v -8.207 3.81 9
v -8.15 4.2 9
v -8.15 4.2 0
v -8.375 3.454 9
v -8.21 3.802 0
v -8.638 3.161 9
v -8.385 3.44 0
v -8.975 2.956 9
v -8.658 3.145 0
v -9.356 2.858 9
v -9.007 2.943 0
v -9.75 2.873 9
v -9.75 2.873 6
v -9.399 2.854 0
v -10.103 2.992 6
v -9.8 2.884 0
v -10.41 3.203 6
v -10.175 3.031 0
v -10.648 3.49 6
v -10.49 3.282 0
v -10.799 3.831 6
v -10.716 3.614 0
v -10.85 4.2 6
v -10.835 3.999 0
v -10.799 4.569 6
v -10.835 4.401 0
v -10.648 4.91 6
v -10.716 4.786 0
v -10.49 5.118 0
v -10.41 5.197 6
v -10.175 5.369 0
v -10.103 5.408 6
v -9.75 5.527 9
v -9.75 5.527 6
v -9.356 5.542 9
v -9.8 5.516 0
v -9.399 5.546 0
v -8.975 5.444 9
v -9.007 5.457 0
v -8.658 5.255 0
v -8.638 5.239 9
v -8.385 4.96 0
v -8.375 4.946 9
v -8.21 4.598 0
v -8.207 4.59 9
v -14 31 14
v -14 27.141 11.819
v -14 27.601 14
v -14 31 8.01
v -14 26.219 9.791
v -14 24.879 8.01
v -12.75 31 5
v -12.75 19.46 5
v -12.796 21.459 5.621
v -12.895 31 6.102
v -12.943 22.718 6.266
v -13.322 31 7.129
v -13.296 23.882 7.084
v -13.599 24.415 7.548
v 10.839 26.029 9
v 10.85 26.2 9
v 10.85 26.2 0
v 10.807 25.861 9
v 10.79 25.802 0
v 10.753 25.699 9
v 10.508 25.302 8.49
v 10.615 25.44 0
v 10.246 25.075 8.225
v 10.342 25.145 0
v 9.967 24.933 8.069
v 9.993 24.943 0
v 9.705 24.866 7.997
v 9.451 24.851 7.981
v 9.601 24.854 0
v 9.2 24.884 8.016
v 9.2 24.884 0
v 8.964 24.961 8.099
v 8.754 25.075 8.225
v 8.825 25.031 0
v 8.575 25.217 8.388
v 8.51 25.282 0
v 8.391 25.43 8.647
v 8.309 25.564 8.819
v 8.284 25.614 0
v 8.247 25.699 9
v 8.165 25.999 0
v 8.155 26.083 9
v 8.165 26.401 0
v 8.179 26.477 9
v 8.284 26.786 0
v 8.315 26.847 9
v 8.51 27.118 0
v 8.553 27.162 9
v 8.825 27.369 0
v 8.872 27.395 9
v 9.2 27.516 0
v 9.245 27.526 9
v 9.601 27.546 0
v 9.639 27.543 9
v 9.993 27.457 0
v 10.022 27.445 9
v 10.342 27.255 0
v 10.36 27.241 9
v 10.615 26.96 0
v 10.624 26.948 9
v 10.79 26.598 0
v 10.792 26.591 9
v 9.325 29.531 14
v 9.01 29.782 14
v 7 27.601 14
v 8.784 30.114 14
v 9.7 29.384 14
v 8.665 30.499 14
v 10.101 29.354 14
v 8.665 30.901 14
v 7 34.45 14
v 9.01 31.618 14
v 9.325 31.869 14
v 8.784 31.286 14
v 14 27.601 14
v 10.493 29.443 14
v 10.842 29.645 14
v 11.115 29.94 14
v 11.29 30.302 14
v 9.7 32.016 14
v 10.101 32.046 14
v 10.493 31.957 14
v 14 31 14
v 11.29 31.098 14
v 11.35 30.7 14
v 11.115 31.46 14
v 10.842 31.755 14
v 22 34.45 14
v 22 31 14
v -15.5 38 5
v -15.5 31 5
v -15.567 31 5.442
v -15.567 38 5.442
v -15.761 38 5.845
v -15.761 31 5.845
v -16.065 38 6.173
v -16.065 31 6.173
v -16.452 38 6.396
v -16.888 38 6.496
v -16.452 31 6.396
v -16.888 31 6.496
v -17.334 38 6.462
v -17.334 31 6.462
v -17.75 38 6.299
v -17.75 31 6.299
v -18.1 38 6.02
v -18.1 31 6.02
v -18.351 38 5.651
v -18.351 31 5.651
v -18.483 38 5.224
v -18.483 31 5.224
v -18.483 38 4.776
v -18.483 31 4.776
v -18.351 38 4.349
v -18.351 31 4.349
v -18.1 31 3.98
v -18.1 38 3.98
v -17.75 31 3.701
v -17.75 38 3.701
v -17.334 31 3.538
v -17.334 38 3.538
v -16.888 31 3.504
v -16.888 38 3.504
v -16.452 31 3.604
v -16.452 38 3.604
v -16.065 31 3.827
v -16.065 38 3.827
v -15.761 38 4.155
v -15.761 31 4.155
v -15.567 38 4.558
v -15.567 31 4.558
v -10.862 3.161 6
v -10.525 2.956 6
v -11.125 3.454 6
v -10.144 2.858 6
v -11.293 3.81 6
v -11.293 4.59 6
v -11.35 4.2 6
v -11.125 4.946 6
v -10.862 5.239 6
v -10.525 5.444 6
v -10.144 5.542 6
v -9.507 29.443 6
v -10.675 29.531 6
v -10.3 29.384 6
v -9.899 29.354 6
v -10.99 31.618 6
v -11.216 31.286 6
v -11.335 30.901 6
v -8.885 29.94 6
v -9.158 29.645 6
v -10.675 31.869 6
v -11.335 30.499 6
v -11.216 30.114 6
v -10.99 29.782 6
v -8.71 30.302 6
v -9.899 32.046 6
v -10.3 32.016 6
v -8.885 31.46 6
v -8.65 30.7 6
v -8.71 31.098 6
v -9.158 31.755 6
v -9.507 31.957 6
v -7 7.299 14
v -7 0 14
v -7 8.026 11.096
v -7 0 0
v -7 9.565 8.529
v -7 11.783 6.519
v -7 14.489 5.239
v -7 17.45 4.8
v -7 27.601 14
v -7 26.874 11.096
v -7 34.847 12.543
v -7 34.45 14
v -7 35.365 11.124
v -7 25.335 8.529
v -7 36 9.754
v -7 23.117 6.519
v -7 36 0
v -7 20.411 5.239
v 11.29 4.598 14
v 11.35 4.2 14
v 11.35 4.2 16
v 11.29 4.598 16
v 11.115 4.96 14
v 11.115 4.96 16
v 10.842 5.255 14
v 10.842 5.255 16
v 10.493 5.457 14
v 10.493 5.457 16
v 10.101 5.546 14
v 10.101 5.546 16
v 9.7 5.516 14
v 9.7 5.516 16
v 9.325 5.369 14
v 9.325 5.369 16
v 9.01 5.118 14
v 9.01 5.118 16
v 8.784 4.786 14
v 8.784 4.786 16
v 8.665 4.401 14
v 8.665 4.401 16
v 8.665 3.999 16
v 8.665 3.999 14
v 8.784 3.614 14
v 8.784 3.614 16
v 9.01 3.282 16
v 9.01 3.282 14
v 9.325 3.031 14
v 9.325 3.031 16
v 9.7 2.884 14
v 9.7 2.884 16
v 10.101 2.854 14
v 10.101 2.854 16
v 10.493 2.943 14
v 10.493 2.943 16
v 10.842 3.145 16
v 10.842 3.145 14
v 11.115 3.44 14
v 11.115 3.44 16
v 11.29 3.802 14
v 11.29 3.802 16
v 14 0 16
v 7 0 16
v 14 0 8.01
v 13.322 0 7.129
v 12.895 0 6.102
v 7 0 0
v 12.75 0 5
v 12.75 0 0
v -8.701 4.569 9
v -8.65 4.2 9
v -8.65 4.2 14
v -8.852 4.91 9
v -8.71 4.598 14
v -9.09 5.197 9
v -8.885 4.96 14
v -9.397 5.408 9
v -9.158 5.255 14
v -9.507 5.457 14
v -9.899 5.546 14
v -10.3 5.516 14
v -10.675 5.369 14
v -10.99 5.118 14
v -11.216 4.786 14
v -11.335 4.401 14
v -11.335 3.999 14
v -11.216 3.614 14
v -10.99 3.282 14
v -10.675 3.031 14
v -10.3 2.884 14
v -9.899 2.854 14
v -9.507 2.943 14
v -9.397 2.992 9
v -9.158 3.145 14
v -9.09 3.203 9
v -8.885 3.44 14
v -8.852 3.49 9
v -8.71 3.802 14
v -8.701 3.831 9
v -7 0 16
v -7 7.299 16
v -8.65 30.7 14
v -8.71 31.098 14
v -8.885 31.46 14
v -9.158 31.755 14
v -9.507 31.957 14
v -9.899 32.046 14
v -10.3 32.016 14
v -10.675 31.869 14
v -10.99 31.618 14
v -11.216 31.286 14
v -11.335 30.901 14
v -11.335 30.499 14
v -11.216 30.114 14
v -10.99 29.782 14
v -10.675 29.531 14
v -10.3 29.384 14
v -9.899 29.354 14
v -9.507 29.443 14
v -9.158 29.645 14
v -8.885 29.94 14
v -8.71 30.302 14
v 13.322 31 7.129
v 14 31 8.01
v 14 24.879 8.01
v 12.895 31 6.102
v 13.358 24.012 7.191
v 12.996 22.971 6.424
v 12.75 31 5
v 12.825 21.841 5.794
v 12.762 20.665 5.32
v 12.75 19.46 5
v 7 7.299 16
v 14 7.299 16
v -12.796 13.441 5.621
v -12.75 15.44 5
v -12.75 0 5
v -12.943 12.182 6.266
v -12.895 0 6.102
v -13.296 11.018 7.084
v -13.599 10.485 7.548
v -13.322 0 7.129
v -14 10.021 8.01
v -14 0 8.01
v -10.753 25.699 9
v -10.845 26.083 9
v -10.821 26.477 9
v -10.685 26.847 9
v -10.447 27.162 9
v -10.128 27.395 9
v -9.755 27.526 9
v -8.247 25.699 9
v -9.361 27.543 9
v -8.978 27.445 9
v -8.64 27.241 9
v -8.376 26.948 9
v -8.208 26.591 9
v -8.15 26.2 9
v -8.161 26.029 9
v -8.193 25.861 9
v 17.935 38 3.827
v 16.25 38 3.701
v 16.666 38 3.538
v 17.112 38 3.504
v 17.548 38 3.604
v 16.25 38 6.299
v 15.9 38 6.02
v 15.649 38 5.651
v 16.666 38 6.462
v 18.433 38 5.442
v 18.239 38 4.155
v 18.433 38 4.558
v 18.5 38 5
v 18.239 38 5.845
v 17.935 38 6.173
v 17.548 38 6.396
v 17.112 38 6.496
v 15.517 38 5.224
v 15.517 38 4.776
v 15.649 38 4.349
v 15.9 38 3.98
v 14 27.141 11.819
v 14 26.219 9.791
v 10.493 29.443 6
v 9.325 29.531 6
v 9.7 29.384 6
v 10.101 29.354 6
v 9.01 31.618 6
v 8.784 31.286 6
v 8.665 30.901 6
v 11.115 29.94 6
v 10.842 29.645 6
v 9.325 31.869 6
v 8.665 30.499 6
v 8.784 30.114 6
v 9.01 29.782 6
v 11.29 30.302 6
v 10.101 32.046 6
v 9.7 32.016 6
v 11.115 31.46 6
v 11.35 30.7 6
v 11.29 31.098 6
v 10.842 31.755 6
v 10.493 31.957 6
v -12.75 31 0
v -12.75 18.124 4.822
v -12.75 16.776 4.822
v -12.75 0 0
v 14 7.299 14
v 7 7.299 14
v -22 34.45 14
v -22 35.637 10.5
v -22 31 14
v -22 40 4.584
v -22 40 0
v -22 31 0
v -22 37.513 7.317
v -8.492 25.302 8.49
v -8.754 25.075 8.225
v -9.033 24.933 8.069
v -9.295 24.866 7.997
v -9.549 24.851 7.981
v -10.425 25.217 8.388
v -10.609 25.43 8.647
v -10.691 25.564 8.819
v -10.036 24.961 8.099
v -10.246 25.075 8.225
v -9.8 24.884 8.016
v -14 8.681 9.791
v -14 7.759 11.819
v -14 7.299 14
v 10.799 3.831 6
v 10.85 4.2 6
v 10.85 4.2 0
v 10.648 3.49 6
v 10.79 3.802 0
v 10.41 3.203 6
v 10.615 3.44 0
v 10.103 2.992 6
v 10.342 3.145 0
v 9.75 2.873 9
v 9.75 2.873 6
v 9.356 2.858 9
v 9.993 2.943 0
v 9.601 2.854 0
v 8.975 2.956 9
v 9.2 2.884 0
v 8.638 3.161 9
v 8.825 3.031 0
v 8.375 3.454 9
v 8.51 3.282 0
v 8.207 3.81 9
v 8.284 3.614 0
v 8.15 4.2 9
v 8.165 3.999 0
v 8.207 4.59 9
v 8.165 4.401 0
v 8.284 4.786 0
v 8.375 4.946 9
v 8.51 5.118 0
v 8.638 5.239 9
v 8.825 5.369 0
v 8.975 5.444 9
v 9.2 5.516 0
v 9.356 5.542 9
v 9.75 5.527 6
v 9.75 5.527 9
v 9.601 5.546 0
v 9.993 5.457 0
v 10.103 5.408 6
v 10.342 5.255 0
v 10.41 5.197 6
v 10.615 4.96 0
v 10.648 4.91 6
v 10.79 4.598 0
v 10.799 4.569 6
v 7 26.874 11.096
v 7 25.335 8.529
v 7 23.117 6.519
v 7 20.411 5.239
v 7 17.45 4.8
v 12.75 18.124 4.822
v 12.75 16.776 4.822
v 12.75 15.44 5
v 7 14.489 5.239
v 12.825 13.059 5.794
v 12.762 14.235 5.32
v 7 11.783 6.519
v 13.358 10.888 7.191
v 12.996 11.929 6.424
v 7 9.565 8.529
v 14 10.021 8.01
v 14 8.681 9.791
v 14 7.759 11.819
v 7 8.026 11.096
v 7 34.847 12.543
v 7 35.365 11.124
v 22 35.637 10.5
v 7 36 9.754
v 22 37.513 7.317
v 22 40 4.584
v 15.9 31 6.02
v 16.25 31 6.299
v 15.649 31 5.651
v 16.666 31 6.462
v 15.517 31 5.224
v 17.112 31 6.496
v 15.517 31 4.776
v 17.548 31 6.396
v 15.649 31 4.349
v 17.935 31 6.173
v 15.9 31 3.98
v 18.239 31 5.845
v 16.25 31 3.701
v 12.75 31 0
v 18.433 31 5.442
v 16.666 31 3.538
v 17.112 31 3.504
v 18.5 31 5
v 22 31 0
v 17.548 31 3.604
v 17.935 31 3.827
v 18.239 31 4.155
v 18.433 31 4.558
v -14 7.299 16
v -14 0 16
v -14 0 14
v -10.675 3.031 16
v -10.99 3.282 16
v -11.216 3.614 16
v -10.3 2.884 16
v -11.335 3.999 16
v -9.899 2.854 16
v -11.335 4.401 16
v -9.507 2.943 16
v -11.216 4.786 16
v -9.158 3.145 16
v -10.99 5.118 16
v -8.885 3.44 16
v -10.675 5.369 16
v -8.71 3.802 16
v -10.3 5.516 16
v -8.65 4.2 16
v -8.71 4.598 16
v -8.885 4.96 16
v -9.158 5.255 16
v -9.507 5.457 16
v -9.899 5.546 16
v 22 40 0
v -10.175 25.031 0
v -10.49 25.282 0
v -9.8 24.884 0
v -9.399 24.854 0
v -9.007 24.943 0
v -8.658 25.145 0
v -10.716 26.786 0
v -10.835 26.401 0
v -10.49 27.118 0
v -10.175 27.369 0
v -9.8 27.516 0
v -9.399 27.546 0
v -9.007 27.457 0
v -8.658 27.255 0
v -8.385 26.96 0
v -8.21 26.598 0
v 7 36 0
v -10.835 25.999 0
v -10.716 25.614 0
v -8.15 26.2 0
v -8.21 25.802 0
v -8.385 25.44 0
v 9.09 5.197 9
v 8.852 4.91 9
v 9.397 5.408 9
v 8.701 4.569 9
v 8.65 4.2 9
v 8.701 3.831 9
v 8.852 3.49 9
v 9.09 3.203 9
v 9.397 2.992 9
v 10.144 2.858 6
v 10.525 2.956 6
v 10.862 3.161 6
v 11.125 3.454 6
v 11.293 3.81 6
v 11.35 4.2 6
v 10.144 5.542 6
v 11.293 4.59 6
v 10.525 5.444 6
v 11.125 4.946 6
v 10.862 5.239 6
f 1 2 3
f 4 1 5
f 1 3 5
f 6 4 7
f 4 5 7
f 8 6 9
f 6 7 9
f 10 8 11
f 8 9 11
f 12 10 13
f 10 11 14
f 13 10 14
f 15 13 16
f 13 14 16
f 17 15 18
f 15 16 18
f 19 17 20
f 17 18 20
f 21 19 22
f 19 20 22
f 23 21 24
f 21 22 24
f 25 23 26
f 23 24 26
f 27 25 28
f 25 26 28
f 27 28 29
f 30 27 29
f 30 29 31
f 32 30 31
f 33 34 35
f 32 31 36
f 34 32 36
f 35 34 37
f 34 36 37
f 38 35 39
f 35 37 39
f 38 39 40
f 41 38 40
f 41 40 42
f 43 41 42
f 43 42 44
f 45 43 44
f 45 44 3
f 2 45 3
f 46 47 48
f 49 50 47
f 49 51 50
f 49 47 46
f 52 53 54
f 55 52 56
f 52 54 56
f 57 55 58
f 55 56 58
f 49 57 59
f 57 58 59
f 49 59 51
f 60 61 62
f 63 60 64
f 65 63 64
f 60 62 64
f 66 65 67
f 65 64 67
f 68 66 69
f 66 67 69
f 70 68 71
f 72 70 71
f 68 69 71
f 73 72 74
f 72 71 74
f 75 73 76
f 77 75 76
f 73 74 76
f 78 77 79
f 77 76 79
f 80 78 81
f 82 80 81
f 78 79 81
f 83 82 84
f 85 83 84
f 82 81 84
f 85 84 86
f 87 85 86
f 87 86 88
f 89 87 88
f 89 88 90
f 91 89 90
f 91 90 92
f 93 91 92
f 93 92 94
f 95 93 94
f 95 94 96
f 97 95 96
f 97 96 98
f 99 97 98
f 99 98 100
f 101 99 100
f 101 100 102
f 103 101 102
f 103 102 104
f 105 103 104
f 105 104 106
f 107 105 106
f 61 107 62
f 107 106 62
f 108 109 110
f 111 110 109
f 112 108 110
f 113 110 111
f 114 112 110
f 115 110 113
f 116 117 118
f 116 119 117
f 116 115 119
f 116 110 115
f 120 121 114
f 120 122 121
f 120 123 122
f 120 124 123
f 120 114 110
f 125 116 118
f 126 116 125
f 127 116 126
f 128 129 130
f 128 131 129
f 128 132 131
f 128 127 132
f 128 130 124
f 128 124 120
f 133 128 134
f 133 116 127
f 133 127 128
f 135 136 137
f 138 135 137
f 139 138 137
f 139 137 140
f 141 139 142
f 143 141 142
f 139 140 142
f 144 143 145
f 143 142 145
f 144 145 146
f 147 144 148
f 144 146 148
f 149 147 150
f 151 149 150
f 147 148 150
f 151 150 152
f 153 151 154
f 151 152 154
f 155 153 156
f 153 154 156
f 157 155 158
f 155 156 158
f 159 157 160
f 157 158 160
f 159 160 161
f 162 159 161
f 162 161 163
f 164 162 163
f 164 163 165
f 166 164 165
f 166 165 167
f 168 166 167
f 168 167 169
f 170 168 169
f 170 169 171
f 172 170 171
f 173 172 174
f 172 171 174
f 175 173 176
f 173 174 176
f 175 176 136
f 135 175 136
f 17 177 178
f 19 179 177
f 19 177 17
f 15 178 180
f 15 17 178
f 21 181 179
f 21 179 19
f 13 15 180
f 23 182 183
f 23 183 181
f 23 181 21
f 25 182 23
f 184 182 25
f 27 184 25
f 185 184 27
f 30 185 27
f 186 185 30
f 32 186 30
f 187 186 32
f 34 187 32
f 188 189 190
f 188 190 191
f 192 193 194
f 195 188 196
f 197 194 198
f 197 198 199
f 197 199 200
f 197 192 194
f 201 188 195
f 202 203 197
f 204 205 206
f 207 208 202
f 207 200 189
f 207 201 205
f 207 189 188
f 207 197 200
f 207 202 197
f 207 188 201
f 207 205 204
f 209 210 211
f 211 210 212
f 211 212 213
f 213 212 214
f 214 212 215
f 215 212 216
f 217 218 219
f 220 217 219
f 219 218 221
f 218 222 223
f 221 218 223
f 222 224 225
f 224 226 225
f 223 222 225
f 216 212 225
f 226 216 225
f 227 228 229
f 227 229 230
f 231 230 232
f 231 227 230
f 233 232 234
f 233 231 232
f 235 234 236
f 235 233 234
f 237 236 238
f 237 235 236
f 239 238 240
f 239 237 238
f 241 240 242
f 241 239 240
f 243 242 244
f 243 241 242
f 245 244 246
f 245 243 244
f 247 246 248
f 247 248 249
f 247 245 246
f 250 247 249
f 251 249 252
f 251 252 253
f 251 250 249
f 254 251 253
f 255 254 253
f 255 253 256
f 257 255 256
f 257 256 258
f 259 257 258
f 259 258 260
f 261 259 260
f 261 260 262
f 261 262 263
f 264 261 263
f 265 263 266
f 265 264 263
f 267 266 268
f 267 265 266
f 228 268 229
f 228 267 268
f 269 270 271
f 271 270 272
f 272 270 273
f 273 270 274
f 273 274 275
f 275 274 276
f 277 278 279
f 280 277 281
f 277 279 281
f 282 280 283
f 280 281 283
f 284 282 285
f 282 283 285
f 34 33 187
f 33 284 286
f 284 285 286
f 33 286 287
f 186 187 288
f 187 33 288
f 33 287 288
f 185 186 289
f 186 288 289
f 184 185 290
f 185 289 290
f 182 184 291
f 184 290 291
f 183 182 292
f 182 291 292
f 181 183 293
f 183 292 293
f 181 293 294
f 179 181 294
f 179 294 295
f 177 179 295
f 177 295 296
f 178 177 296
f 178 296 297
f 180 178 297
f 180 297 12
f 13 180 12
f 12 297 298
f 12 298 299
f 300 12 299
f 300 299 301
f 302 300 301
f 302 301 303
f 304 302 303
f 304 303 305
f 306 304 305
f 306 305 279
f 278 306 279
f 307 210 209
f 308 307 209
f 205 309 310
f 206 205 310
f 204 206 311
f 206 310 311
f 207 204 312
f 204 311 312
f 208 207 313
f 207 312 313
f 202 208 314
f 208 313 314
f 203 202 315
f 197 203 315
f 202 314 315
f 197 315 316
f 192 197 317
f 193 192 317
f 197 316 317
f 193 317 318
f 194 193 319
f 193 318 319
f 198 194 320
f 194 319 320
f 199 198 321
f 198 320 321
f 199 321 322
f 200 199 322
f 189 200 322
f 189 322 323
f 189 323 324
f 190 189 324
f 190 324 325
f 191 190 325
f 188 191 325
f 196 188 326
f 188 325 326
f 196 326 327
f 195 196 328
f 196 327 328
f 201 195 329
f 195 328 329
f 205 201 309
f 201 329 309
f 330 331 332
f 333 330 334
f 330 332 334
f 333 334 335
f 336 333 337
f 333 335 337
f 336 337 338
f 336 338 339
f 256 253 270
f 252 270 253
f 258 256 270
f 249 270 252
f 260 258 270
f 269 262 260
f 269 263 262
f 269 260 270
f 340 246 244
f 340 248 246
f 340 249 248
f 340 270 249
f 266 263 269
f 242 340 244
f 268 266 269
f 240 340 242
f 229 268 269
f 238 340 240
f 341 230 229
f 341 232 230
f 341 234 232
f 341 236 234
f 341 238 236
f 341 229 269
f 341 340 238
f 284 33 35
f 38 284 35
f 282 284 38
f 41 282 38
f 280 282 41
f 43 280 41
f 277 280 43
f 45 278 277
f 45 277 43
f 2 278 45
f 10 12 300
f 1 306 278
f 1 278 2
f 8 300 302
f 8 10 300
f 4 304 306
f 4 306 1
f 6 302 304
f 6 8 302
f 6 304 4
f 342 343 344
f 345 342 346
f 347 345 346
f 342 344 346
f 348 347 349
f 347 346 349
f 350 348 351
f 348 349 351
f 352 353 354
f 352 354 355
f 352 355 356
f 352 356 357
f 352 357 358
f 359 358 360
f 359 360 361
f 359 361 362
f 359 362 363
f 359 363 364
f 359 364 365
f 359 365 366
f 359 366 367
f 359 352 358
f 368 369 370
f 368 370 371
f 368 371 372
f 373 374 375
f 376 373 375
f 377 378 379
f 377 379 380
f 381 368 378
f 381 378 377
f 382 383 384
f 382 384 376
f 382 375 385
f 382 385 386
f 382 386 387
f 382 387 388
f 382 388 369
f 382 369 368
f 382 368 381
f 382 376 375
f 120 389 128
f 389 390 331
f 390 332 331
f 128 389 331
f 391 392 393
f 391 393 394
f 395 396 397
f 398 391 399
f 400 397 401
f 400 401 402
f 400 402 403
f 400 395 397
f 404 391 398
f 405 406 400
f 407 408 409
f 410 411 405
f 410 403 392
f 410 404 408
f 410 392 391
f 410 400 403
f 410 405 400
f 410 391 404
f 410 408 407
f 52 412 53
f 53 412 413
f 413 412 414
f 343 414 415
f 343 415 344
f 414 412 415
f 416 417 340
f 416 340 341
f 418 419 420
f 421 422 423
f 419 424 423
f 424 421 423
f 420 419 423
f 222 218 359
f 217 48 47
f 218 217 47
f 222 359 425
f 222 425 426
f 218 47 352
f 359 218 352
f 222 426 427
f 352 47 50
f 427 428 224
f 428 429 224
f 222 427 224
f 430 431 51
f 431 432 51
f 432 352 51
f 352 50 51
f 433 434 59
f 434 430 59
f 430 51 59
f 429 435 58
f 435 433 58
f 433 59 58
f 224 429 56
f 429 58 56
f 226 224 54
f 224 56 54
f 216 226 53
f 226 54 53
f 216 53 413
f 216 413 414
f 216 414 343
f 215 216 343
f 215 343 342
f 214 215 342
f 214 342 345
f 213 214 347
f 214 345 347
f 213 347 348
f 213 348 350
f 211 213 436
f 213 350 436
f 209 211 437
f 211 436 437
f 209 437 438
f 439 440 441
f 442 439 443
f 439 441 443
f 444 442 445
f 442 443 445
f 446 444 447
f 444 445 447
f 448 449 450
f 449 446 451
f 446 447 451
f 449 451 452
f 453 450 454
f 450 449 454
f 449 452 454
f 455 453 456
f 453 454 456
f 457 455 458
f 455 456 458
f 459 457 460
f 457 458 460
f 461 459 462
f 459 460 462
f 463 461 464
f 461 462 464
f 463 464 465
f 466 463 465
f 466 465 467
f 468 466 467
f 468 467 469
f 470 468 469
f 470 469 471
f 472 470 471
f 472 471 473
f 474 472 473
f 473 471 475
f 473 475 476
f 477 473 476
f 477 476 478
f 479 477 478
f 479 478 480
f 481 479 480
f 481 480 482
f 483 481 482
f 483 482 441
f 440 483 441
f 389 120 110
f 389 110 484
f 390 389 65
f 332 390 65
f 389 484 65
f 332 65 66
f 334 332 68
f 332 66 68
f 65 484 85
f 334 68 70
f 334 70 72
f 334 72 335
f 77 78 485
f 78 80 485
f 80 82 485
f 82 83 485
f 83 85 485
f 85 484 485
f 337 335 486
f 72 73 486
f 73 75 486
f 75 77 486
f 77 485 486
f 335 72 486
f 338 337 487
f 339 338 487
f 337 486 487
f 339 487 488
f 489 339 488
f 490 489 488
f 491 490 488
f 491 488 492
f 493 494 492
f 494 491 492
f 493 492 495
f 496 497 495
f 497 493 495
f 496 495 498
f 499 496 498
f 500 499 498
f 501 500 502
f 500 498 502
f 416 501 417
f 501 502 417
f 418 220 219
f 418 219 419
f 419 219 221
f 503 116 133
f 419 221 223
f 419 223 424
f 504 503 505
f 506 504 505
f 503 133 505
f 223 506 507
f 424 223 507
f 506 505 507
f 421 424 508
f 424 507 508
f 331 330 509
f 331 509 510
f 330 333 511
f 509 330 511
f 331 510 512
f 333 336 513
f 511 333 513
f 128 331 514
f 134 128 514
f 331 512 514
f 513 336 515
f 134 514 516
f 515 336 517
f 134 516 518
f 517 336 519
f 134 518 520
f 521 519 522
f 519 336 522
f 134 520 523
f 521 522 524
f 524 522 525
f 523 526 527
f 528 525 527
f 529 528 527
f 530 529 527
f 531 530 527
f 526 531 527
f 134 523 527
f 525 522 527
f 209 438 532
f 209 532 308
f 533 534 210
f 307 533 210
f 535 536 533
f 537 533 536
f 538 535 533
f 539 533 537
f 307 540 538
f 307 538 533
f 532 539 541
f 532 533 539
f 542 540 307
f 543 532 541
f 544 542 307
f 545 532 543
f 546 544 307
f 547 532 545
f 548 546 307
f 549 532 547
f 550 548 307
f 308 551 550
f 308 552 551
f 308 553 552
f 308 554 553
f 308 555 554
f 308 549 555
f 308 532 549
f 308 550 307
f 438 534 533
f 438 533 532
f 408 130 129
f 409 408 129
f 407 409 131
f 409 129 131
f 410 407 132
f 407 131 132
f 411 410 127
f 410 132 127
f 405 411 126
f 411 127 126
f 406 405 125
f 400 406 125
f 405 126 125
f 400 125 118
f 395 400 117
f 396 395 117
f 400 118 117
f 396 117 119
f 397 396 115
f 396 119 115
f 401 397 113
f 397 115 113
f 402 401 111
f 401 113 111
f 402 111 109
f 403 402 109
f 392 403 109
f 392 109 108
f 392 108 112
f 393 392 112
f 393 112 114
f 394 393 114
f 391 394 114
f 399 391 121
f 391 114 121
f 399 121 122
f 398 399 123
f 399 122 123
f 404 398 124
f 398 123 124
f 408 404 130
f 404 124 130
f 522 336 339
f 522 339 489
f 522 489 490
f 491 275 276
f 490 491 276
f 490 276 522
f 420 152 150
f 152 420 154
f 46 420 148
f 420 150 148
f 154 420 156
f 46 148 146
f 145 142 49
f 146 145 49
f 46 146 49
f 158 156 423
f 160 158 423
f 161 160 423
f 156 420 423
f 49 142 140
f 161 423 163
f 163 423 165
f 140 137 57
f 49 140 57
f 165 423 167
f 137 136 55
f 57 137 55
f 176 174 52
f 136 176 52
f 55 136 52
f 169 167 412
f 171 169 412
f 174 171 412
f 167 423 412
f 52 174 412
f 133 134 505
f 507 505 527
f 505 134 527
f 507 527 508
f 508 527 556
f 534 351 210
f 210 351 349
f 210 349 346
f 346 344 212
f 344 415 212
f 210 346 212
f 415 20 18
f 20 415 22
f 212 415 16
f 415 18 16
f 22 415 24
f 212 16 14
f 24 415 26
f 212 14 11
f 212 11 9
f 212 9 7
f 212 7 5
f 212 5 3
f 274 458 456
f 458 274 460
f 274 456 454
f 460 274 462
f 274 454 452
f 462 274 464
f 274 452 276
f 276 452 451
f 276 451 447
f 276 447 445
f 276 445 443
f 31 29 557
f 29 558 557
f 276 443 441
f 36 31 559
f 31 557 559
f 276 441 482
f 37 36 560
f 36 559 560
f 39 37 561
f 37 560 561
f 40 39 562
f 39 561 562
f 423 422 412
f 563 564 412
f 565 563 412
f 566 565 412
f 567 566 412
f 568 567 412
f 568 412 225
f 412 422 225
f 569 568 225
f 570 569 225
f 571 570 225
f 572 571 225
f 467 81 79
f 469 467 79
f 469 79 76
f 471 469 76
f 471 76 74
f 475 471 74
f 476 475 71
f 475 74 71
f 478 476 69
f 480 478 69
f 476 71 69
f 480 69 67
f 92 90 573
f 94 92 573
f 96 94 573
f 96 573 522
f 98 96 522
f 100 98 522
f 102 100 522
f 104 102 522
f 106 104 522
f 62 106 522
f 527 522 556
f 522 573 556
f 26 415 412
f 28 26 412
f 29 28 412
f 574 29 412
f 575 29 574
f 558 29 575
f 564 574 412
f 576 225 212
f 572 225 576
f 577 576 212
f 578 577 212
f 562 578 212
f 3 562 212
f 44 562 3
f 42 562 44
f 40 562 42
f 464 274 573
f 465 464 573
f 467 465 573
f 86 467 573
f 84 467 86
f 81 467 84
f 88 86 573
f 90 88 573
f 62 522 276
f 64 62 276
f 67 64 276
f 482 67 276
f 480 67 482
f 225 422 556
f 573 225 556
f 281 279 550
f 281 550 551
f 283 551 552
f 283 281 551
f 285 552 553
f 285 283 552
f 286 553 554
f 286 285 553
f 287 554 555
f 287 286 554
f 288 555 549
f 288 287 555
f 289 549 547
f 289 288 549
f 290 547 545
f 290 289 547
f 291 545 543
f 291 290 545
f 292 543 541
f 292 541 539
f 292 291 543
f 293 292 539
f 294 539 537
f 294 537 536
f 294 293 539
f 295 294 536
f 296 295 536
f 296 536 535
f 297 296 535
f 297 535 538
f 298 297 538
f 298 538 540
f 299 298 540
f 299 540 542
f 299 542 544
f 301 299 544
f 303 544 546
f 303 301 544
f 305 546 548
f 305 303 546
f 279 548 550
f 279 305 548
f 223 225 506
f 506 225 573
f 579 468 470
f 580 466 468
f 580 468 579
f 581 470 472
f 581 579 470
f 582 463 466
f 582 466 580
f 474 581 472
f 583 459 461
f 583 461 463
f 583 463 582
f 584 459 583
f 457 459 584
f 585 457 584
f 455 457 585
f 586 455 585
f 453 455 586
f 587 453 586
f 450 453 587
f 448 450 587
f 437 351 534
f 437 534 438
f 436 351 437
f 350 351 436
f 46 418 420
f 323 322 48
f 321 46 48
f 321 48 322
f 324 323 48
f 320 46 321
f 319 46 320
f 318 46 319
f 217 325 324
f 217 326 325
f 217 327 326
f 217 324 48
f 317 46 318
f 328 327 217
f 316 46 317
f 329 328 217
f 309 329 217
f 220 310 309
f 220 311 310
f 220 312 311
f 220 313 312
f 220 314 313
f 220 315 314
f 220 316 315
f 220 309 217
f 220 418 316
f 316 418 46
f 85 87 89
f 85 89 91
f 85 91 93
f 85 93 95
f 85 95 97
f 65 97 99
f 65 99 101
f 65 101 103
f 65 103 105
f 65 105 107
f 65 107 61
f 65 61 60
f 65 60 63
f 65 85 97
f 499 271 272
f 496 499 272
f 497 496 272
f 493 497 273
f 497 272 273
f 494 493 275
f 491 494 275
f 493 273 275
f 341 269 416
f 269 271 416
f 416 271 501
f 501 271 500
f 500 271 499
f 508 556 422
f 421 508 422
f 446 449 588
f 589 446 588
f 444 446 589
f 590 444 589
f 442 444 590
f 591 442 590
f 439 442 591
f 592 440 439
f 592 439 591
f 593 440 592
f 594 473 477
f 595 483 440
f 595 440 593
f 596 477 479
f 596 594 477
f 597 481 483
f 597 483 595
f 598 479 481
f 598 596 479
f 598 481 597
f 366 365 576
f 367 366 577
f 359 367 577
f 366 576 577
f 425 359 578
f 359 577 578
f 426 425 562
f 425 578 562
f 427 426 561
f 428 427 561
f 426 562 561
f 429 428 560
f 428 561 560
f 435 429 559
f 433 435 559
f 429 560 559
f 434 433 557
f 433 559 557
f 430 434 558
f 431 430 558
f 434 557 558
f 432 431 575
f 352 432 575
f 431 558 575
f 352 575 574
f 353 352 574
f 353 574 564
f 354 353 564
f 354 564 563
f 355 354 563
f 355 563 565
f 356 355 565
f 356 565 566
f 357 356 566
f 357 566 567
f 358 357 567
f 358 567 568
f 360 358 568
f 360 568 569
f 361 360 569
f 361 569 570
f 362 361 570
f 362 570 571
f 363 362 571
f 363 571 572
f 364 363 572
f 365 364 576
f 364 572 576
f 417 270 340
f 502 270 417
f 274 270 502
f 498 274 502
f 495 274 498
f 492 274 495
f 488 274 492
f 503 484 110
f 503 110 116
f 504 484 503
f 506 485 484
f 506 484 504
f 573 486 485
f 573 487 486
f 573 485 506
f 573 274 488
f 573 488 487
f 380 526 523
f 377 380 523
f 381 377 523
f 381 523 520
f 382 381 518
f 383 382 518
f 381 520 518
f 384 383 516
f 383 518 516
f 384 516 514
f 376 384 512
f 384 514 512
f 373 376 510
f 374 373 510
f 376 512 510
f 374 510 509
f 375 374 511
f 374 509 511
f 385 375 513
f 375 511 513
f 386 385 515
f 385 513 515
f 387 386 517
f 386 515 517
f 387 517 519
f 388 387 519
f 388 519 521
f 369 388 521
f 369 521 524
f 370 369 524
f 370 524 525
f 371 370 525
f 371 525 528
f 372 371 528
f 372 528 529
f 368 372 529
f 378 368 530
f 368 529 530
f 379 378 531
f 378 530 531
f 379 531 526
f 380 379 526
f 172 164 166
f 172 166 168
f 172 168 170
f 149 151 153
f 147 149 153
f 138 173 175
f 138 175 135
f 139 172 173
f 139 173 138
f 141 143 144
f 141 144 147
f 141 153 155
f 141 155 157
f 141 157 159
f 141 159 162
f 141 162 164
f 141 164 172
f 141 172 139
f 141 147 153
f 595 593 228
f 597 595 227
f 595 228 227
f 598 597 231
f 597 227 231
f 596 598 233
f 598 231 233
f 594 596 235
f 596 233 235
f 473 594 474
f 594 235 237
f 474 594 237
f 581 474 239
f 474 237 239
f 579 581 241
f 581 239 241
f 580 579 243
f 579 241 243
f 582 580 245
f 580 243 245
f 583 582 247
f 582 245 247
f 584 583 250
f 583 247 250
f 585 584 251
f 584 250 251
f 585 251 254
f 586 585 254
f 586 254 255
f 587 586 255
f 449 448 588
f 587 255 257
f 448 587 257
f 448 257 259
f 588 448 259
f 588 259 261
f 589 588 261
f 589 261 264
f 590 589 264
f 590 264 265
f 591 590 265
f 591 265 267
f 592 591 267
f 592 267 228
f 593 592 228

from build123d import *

# Parameters (mm, degrees)
F0_W      = 7
F0_H      = 31
F1_DEPTH  = 14
F2_R      = 1.35
F3_DEPTH  = 8
F4_R      = 10.2
F5_DEPTH  = 30
F6_R      = 1.35
F7_DEPTH  = 9
F8_R      = 1.5
F9_DEPTH  = 7
F10_R     = 18
F11_DEPTH = 44.001
F13_DEPTH = 31
F14_W     = 7
F14_H     = 7.299138
F14_R     = 1.35
F15_DEPTH = 2


with BuildPart() as f1:
    # F0 (on Top) → F1 (new body)
    with BuildSketch(Plane.XY):
        with Locations((-10.5, 15.5)):
            Rectangle(F0_W, F0_H)
        Polygon((-22, 31), (-14, 31), (-7, 31), (-7, 36), (7, 36), (7, 31), (14, 31), (22, 31), (22, 40), (-22, 40), align=None)
        with Locations((10.5, 15.5)):
            Rectangle(F0_W, F0_H)
    extrude(amount=F1_DEPTH)

    # F2 (on face) → F3 (cut)
    with BuildSketch(Plane.XY.offset(14)):
        with Locations((-10, 4.2)):
            Circle(F2_R)
        with Locations((-10, 30.7)):
            Circle(F2_R)
        with Locations((10, 30.7)):
            Circle(F2_R)
        with Locations((10, 4.2)):
            Circle(F2_R)
    extrude(amount=-F3_DEPTH, mode=Mode.SUBTRACT)

    # F4 (on face) → F5 (cut)
    with BuildSketch(Plane(origin=(-14, 0, 0), x_dir=(0, -1, 0), z_dir=(-1, 0, 0))):
        with Locations((-17.45, 15)):
            Circle(F4_R)
    extrude(amount=-F5_DEPTH, mode=Mode.SUBTRACT)

    # F6 (on face) → F7 (cut)
    with BuildSketch(Plane(origin=(0, 0, 0), x_dir=(1, 0, 0), z_dir=(0, 0, -1))):
        with Locations((9.5, -4.2)):
            Circle(F6_R)
        with Locations((-9.5, -4.2)):
            Circle(F6_R)
        with Locations((9.5, -26.2)):
            Circle(F6_R)
        with Locations((-9.5, -26.2)):
            Circle(F6_R)
    extrude(amount=-F7_DEPTH, mode=Mode.SUBTRACT)

    # F8 (on face) → F9 (cut)
    with BuildSketch(Plane.XZ.offset(-31)):
        with Locations((-17, 5)):
            Circle(F8_R)
        with Locations((17, 5)):
            Circle(F8_R)
    extrude(amount=-F9_DEPTH, mode=Mode.SUBTRACT)

    # F10 (on face) → F11 (cut, through all)
    with BuildSketch(Plane.YZ.offset(22)):
        with Locations((52, 18)):
            Circle(F10_R)
    extrude(amount=-F11_DEPTH, mode=Mode.SUBTRACT)

    # F12 (on face) → F13 (cut, through all)
    with BuildSketch(Plane.XZ):
        with BuildLine():
            Line((-12.75, -4.045816), (-12.75, 5))
            ThreePointArc((-12.75, 5), (-18.807251, 8.846602), (-19.712986, 1.728577))
            Line((-19.712986, 1.728577), (-12.75, -4.045816))
        make_face()
        with BuildLine():
            Line((12.75, -4.045816), (19.712986, 1.728577))
            ThreePointArc((19.712986, 1.728577), (18.807251, 8.846602), (12.75, 5))
            Line((12.75, 5), (12.75, -4.045816))
        make_face()
    extrude(amount=-F13_DEPTH, mode=Mode.SUBTRACT)

    # F14 (on face) → F15 (join)
    with BuildSketch(Plane.XY.offset(14)):
        with Locations((10.5, 3.649569)):
            Rectangle(F14_W, F14_H)
        with Locations((10, 4.2)):
            Circle(F14_R, mode=Mode.SUBTRACT)
        with Locations((-10.5, 3.649569)):
            Rectangle(F14_W, F14_H)
        with Locations((-10, 4.2)):
            Circle(F14_R, mode=Mode.SUBTRACT)
    extrude(amount=F15_DEPTH)


solid = f1.part
